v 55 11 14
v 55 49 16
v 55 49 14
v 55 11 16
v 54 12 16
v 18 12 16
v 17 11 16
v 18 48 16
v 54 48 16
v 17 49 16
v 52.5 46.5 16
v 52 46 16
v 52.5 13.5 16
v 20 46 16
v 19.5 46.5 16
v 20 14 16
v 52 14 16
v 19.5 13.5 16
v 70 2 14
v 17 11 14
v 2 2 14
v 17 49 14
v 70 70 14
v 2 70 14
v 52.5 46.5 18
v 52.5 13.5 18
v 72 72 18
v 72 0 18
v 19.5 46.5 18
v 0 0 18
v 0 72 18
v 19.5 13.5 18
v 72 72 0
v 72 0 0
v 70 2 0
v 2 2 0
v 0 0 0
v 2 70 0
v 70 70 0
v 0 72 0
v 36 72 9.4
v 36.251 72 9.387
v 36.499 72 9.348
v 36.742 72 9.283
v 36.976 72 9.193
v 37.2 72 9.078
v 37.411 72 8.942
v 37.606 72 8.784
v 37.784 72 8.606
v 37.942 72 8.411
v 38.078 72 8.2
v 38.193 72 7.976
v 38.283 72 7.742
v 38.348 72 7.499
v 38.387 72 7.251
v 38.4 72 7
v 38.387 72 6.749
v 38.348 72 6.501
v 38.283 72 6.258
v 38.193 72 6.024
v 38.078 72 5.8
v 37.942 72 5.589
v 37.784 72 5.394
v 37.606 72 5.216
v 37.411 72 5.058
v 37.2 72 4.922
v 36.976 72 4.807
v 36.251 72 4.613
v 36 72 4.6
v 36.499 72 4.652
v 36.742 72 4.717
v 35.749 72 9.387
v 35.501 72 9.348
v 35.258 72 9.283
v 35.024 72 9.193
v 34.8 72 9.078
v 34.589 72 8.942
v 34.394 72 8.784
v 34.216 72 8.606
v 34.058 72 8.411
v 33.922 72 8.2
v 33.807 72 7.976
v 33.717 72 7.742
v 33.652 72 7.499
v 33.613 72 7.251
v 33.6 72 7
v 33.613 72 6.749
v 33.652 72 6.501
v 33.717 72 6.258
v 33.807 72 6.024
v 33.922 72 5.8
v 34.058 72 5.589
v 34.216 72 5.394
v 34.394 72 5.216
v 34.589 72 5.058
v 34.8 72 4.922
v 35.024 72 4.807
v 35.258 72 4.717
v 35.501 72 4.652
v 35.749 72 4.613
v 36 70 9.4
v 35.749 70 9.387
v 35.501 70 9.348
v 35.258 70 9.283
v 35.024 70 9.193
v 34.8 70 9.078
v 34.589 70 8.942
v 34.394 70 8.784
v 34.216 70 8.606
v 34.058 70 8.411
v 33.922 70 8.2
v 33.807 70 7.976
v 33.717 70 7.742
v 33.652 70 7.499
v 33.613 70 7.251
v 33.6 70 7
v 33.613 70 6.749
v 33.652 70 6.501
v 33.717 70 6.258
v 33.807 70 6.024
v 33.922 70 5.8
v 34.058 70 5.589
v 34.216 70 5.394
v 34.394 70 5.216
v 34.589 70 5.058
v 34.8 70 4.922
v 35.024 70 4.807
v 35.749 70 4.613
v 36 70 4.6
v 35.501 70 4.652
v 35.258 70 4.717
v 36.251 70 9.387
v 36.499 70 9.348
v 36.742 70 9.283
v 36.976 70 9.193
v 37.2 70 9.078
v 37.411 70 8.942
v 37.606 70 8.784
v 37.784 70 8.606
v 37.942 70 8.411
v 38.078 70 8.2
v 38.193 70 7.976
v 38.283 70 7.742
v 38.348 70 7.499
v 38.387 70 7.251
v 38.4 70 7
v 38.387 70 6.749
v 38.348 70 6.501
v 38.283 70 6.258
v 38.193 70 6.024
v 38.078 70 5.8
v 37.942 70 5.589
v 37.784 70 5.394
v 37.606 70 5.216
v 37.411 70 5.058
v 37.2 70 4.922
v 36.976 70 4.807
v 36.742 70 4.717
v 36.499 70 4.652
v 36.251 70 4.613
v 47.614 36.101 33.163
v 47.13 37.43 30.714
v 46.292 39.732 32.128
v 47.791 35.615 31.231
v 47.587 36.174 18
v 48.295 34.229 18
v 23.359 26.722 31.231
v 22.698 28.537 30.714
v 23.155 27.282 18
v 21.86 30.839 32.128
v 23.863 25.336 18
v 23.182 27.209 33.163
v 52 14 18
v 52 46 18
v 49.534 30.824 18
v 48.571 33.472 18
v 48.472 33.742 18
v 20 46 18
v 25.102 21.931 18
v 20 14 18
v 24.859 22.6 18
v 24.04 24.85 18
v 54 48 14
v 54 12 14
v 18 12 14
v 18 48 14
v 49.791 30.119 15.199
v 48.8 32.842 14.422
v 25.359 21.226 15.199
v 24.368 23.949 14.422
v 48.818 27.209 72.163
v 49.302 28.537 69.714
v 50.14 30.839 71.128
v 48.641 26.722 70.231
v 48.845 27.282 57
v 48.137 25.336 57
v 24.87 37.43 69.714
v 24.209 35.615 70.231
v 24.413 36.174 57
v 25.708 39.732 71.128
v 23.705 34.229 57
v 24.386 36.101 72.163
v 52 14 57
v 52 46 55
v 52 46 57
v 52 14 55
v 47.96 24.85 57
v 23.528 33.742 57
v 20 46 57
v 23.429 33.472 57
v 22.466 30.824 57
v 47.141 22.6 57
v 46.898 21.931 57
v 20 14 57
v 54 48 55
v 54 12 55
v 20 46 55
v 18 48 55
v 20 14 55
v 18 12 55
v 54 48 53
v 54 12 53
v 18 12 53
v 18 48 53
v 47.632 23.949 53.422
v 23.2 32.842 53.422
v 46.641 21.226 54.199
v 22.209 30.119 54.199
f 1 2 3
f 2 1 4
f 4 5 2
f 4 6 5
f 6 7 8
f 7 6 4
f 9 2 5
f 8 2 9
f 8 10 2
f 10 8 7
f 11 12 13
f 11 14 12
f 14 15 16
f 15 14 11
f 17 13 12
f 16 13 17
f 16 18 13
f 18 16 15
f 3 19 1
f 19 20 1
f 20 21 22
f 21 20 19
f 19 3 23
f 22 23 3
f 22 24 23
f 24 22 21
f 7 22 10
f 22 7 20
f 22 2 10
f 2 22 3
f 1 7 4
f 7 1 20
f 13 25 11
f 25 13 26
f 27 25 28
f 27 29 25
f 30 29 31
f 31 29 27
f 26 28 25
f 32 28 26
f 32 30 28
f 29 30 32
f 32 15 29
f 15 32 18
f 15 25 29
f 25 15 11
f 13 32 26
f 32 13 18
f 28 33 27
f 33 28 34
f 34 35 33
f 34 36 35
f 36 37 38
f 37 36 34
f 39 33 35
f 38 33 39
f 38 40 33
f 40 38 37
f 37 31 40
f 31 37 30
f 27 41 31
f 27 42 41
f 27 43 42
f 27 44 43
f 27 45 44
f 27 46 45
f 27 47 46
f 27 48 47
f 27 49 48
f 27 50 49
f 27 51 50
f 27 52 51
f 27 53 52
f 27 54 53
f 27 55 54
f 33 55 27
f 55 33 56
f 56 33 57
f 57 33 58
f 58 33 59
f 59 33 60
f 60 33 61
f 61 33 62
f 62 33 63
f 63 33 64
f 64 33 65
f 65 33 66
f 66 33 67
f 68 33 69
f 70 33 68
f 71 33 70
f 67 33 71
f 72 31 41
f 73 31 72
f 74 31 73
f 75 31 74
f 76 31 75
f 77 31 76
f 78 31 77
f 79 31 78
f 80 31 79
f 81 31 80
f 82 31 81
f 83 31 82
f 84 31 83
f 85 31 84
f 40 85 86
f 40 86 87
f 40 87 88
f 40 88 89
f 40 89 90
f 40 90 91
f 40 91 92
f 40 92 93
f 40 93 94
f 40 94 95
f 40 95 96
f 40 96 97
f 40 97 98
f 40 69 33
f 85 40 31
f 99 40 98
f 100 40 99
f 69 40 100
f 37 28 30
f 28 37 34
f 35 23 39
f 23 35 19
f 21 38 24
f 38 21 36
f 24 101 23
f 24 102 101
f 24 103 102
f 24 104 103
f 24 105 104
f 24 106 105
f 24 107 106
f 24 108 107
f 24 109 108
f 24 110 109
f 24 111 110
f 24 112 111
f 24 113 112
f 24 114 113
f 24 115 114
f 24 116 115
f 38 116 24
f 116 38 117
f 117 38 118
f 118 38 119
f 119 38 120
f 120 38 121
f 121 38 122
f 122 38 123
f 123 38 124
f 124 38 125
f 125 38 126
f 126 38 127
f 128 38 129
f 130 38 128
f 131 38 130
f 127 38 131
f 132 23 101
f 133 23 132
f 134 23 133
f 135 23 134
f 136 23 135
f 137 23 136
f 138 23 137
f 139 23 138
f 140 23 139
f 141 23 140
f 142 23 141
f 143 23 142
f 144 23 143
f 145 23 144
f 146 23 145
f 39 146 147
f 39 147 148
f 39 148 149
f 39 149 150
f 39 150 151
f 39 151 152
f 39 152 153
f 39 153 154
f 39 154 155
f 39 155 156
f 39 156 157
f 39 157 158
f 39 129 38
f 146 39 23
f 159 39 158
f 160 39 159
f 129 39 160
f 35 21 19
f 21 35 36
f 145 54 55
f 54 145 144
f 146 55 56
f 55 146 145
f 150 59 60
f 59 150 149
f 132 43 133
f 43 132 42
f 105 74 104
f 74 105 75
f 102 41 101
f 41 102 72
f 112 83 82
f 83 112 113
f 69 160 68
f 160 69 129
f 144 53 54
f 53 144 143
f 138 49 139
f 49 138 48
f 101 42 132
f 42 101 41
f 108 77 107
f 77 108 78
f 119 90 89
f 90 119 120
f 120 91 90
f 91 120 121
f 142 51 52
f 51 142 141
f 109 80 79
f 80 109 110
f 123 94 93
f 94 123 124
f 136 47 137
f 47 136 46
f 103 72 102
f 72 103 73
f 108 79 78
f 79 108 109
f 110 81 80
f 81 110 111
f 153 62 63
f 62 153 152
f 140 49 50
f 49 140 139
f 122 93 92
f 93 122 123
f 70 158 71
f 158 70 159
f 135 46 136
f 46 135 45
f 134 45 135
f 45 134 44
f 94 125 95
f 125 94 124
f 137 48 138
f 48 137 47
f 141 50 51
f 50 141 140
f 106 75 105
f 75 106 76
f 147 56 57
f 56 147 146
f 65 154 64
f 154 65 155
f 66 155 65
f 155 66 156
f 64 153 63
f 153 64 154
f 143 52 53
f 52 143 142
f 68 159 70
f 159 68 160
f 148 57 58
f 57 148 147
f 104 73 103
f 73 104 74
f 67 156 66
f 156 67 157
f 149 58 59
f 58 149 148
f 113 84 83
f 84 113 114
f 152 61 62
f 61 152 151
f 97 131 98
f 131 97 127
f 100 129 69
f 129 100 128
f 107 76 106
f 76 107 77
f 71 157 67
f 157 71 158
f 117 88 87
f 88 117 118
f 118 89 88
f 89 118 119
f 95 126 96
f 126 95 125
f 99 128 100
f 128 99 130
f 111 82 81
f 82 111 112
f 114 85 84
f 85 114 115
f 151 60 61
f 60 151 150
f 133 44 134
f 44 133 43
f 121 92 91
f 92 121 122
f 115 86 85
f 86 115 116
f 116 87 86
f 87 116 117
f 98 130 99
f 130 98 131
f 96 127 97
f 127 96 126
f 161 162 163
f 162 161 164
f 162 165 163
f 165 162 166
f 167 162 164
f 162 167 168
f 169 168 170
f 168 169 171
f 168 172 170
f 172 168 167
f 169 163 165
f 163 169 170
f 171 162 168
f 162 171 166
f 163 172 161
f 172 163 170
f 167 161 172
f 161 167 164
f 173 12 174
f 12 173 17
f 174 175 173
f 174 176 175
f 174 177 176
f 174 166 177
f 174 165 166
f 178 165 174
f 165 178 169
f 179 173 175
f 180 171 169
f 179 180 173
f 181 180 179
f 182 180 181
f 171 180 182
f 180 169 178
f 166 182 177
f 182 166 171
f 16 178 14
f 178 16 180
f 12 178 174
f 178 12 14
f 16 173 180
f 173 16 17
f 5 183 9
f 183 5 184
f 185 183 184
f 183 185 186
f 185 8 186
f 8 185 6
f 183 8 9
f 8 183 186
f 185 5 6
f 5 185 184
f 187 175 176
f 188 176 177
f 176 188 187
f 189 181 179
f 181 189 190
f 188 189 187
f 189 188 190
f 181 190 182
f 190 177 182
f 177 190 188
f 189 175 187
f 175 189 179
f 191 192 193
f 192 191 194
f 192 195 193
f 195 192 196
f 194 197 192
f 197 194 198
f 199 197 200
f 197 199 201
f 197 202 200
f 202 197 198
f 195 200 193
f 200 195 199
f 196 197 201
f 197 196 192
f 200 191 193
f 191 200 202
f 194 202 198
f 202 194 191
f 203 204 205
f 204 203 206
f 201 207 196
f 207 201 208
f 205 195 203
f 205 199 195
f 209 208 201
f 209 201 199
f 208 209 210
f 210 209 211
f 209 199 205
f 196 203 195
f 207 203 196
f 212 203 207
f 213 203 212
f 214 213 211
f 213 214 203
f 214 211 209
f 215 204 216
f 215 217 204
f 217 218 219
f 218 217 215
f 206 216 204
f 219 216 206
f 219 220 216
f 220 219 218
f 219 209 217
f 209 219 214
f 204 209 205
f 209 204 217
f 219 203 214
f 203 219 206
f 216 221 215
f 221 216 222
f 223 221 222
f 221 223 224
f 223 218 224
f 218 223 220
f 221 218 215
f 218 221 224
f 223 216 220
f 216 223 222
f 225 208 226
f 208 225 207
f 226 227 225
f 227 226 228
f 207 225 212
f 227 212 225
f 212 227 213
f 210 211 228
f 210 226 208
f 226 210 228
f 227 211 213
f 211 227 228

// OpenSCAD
$fn = 60;

x = 68;
h = 14;
wbase = 4;
wwall = 2;

offset = 30;

//--------------------------------------------------------

base();
translate([(wwall + x + wwall) / 2, offset, h + 1]) insert(20);
translate([(wwall + x + wwall) / 2, offset, h + 40]) insert(-20);

//--------------------------------------------------------

module base() {
	  difference() {
		cube([wwall + x + wwall, wwall + x + wwall, wbase + h]);
			
		translate([wwall , wwall, -wbase]) cube([x, x, wbase + h]);

		translate([(wwall + x + wwall) / 2, offset, h + 1]) union() {
			  translate([0, 0, 0]) cube([38, 38, 2], center = true);
			  translate([0, 0, 2]) cube([33, 33, 2], center = true);
		}
		translate([(wwall + x + wwall) / 2, (wwall + x + wwall), h / 2]) rotate([90, 0, 0]) cylinder(h=wbase, d=4.8, center = true);
	}
}

module insert(angle) {
	  difference() {
			union() {
				  translate([0, 0, 2]) cube([32, 32, 2], center = true);
				  translate([0, 0, 0]) cube([36, 36, 2], center = true);
				  rotate([-15, 0, angle]) {
						translate([0, 0, 15 / 2 + 1]) cube([26, 2, 15], center = true);
						translate([0, -1, 15 + 2]) cube([26, 3 + 1, 2], center = true);
				  }
			}
			rotate([-15, 0, angle]) translate([0, -3, 1]) cube([26, 3, 4], center = true);
	 }
}
